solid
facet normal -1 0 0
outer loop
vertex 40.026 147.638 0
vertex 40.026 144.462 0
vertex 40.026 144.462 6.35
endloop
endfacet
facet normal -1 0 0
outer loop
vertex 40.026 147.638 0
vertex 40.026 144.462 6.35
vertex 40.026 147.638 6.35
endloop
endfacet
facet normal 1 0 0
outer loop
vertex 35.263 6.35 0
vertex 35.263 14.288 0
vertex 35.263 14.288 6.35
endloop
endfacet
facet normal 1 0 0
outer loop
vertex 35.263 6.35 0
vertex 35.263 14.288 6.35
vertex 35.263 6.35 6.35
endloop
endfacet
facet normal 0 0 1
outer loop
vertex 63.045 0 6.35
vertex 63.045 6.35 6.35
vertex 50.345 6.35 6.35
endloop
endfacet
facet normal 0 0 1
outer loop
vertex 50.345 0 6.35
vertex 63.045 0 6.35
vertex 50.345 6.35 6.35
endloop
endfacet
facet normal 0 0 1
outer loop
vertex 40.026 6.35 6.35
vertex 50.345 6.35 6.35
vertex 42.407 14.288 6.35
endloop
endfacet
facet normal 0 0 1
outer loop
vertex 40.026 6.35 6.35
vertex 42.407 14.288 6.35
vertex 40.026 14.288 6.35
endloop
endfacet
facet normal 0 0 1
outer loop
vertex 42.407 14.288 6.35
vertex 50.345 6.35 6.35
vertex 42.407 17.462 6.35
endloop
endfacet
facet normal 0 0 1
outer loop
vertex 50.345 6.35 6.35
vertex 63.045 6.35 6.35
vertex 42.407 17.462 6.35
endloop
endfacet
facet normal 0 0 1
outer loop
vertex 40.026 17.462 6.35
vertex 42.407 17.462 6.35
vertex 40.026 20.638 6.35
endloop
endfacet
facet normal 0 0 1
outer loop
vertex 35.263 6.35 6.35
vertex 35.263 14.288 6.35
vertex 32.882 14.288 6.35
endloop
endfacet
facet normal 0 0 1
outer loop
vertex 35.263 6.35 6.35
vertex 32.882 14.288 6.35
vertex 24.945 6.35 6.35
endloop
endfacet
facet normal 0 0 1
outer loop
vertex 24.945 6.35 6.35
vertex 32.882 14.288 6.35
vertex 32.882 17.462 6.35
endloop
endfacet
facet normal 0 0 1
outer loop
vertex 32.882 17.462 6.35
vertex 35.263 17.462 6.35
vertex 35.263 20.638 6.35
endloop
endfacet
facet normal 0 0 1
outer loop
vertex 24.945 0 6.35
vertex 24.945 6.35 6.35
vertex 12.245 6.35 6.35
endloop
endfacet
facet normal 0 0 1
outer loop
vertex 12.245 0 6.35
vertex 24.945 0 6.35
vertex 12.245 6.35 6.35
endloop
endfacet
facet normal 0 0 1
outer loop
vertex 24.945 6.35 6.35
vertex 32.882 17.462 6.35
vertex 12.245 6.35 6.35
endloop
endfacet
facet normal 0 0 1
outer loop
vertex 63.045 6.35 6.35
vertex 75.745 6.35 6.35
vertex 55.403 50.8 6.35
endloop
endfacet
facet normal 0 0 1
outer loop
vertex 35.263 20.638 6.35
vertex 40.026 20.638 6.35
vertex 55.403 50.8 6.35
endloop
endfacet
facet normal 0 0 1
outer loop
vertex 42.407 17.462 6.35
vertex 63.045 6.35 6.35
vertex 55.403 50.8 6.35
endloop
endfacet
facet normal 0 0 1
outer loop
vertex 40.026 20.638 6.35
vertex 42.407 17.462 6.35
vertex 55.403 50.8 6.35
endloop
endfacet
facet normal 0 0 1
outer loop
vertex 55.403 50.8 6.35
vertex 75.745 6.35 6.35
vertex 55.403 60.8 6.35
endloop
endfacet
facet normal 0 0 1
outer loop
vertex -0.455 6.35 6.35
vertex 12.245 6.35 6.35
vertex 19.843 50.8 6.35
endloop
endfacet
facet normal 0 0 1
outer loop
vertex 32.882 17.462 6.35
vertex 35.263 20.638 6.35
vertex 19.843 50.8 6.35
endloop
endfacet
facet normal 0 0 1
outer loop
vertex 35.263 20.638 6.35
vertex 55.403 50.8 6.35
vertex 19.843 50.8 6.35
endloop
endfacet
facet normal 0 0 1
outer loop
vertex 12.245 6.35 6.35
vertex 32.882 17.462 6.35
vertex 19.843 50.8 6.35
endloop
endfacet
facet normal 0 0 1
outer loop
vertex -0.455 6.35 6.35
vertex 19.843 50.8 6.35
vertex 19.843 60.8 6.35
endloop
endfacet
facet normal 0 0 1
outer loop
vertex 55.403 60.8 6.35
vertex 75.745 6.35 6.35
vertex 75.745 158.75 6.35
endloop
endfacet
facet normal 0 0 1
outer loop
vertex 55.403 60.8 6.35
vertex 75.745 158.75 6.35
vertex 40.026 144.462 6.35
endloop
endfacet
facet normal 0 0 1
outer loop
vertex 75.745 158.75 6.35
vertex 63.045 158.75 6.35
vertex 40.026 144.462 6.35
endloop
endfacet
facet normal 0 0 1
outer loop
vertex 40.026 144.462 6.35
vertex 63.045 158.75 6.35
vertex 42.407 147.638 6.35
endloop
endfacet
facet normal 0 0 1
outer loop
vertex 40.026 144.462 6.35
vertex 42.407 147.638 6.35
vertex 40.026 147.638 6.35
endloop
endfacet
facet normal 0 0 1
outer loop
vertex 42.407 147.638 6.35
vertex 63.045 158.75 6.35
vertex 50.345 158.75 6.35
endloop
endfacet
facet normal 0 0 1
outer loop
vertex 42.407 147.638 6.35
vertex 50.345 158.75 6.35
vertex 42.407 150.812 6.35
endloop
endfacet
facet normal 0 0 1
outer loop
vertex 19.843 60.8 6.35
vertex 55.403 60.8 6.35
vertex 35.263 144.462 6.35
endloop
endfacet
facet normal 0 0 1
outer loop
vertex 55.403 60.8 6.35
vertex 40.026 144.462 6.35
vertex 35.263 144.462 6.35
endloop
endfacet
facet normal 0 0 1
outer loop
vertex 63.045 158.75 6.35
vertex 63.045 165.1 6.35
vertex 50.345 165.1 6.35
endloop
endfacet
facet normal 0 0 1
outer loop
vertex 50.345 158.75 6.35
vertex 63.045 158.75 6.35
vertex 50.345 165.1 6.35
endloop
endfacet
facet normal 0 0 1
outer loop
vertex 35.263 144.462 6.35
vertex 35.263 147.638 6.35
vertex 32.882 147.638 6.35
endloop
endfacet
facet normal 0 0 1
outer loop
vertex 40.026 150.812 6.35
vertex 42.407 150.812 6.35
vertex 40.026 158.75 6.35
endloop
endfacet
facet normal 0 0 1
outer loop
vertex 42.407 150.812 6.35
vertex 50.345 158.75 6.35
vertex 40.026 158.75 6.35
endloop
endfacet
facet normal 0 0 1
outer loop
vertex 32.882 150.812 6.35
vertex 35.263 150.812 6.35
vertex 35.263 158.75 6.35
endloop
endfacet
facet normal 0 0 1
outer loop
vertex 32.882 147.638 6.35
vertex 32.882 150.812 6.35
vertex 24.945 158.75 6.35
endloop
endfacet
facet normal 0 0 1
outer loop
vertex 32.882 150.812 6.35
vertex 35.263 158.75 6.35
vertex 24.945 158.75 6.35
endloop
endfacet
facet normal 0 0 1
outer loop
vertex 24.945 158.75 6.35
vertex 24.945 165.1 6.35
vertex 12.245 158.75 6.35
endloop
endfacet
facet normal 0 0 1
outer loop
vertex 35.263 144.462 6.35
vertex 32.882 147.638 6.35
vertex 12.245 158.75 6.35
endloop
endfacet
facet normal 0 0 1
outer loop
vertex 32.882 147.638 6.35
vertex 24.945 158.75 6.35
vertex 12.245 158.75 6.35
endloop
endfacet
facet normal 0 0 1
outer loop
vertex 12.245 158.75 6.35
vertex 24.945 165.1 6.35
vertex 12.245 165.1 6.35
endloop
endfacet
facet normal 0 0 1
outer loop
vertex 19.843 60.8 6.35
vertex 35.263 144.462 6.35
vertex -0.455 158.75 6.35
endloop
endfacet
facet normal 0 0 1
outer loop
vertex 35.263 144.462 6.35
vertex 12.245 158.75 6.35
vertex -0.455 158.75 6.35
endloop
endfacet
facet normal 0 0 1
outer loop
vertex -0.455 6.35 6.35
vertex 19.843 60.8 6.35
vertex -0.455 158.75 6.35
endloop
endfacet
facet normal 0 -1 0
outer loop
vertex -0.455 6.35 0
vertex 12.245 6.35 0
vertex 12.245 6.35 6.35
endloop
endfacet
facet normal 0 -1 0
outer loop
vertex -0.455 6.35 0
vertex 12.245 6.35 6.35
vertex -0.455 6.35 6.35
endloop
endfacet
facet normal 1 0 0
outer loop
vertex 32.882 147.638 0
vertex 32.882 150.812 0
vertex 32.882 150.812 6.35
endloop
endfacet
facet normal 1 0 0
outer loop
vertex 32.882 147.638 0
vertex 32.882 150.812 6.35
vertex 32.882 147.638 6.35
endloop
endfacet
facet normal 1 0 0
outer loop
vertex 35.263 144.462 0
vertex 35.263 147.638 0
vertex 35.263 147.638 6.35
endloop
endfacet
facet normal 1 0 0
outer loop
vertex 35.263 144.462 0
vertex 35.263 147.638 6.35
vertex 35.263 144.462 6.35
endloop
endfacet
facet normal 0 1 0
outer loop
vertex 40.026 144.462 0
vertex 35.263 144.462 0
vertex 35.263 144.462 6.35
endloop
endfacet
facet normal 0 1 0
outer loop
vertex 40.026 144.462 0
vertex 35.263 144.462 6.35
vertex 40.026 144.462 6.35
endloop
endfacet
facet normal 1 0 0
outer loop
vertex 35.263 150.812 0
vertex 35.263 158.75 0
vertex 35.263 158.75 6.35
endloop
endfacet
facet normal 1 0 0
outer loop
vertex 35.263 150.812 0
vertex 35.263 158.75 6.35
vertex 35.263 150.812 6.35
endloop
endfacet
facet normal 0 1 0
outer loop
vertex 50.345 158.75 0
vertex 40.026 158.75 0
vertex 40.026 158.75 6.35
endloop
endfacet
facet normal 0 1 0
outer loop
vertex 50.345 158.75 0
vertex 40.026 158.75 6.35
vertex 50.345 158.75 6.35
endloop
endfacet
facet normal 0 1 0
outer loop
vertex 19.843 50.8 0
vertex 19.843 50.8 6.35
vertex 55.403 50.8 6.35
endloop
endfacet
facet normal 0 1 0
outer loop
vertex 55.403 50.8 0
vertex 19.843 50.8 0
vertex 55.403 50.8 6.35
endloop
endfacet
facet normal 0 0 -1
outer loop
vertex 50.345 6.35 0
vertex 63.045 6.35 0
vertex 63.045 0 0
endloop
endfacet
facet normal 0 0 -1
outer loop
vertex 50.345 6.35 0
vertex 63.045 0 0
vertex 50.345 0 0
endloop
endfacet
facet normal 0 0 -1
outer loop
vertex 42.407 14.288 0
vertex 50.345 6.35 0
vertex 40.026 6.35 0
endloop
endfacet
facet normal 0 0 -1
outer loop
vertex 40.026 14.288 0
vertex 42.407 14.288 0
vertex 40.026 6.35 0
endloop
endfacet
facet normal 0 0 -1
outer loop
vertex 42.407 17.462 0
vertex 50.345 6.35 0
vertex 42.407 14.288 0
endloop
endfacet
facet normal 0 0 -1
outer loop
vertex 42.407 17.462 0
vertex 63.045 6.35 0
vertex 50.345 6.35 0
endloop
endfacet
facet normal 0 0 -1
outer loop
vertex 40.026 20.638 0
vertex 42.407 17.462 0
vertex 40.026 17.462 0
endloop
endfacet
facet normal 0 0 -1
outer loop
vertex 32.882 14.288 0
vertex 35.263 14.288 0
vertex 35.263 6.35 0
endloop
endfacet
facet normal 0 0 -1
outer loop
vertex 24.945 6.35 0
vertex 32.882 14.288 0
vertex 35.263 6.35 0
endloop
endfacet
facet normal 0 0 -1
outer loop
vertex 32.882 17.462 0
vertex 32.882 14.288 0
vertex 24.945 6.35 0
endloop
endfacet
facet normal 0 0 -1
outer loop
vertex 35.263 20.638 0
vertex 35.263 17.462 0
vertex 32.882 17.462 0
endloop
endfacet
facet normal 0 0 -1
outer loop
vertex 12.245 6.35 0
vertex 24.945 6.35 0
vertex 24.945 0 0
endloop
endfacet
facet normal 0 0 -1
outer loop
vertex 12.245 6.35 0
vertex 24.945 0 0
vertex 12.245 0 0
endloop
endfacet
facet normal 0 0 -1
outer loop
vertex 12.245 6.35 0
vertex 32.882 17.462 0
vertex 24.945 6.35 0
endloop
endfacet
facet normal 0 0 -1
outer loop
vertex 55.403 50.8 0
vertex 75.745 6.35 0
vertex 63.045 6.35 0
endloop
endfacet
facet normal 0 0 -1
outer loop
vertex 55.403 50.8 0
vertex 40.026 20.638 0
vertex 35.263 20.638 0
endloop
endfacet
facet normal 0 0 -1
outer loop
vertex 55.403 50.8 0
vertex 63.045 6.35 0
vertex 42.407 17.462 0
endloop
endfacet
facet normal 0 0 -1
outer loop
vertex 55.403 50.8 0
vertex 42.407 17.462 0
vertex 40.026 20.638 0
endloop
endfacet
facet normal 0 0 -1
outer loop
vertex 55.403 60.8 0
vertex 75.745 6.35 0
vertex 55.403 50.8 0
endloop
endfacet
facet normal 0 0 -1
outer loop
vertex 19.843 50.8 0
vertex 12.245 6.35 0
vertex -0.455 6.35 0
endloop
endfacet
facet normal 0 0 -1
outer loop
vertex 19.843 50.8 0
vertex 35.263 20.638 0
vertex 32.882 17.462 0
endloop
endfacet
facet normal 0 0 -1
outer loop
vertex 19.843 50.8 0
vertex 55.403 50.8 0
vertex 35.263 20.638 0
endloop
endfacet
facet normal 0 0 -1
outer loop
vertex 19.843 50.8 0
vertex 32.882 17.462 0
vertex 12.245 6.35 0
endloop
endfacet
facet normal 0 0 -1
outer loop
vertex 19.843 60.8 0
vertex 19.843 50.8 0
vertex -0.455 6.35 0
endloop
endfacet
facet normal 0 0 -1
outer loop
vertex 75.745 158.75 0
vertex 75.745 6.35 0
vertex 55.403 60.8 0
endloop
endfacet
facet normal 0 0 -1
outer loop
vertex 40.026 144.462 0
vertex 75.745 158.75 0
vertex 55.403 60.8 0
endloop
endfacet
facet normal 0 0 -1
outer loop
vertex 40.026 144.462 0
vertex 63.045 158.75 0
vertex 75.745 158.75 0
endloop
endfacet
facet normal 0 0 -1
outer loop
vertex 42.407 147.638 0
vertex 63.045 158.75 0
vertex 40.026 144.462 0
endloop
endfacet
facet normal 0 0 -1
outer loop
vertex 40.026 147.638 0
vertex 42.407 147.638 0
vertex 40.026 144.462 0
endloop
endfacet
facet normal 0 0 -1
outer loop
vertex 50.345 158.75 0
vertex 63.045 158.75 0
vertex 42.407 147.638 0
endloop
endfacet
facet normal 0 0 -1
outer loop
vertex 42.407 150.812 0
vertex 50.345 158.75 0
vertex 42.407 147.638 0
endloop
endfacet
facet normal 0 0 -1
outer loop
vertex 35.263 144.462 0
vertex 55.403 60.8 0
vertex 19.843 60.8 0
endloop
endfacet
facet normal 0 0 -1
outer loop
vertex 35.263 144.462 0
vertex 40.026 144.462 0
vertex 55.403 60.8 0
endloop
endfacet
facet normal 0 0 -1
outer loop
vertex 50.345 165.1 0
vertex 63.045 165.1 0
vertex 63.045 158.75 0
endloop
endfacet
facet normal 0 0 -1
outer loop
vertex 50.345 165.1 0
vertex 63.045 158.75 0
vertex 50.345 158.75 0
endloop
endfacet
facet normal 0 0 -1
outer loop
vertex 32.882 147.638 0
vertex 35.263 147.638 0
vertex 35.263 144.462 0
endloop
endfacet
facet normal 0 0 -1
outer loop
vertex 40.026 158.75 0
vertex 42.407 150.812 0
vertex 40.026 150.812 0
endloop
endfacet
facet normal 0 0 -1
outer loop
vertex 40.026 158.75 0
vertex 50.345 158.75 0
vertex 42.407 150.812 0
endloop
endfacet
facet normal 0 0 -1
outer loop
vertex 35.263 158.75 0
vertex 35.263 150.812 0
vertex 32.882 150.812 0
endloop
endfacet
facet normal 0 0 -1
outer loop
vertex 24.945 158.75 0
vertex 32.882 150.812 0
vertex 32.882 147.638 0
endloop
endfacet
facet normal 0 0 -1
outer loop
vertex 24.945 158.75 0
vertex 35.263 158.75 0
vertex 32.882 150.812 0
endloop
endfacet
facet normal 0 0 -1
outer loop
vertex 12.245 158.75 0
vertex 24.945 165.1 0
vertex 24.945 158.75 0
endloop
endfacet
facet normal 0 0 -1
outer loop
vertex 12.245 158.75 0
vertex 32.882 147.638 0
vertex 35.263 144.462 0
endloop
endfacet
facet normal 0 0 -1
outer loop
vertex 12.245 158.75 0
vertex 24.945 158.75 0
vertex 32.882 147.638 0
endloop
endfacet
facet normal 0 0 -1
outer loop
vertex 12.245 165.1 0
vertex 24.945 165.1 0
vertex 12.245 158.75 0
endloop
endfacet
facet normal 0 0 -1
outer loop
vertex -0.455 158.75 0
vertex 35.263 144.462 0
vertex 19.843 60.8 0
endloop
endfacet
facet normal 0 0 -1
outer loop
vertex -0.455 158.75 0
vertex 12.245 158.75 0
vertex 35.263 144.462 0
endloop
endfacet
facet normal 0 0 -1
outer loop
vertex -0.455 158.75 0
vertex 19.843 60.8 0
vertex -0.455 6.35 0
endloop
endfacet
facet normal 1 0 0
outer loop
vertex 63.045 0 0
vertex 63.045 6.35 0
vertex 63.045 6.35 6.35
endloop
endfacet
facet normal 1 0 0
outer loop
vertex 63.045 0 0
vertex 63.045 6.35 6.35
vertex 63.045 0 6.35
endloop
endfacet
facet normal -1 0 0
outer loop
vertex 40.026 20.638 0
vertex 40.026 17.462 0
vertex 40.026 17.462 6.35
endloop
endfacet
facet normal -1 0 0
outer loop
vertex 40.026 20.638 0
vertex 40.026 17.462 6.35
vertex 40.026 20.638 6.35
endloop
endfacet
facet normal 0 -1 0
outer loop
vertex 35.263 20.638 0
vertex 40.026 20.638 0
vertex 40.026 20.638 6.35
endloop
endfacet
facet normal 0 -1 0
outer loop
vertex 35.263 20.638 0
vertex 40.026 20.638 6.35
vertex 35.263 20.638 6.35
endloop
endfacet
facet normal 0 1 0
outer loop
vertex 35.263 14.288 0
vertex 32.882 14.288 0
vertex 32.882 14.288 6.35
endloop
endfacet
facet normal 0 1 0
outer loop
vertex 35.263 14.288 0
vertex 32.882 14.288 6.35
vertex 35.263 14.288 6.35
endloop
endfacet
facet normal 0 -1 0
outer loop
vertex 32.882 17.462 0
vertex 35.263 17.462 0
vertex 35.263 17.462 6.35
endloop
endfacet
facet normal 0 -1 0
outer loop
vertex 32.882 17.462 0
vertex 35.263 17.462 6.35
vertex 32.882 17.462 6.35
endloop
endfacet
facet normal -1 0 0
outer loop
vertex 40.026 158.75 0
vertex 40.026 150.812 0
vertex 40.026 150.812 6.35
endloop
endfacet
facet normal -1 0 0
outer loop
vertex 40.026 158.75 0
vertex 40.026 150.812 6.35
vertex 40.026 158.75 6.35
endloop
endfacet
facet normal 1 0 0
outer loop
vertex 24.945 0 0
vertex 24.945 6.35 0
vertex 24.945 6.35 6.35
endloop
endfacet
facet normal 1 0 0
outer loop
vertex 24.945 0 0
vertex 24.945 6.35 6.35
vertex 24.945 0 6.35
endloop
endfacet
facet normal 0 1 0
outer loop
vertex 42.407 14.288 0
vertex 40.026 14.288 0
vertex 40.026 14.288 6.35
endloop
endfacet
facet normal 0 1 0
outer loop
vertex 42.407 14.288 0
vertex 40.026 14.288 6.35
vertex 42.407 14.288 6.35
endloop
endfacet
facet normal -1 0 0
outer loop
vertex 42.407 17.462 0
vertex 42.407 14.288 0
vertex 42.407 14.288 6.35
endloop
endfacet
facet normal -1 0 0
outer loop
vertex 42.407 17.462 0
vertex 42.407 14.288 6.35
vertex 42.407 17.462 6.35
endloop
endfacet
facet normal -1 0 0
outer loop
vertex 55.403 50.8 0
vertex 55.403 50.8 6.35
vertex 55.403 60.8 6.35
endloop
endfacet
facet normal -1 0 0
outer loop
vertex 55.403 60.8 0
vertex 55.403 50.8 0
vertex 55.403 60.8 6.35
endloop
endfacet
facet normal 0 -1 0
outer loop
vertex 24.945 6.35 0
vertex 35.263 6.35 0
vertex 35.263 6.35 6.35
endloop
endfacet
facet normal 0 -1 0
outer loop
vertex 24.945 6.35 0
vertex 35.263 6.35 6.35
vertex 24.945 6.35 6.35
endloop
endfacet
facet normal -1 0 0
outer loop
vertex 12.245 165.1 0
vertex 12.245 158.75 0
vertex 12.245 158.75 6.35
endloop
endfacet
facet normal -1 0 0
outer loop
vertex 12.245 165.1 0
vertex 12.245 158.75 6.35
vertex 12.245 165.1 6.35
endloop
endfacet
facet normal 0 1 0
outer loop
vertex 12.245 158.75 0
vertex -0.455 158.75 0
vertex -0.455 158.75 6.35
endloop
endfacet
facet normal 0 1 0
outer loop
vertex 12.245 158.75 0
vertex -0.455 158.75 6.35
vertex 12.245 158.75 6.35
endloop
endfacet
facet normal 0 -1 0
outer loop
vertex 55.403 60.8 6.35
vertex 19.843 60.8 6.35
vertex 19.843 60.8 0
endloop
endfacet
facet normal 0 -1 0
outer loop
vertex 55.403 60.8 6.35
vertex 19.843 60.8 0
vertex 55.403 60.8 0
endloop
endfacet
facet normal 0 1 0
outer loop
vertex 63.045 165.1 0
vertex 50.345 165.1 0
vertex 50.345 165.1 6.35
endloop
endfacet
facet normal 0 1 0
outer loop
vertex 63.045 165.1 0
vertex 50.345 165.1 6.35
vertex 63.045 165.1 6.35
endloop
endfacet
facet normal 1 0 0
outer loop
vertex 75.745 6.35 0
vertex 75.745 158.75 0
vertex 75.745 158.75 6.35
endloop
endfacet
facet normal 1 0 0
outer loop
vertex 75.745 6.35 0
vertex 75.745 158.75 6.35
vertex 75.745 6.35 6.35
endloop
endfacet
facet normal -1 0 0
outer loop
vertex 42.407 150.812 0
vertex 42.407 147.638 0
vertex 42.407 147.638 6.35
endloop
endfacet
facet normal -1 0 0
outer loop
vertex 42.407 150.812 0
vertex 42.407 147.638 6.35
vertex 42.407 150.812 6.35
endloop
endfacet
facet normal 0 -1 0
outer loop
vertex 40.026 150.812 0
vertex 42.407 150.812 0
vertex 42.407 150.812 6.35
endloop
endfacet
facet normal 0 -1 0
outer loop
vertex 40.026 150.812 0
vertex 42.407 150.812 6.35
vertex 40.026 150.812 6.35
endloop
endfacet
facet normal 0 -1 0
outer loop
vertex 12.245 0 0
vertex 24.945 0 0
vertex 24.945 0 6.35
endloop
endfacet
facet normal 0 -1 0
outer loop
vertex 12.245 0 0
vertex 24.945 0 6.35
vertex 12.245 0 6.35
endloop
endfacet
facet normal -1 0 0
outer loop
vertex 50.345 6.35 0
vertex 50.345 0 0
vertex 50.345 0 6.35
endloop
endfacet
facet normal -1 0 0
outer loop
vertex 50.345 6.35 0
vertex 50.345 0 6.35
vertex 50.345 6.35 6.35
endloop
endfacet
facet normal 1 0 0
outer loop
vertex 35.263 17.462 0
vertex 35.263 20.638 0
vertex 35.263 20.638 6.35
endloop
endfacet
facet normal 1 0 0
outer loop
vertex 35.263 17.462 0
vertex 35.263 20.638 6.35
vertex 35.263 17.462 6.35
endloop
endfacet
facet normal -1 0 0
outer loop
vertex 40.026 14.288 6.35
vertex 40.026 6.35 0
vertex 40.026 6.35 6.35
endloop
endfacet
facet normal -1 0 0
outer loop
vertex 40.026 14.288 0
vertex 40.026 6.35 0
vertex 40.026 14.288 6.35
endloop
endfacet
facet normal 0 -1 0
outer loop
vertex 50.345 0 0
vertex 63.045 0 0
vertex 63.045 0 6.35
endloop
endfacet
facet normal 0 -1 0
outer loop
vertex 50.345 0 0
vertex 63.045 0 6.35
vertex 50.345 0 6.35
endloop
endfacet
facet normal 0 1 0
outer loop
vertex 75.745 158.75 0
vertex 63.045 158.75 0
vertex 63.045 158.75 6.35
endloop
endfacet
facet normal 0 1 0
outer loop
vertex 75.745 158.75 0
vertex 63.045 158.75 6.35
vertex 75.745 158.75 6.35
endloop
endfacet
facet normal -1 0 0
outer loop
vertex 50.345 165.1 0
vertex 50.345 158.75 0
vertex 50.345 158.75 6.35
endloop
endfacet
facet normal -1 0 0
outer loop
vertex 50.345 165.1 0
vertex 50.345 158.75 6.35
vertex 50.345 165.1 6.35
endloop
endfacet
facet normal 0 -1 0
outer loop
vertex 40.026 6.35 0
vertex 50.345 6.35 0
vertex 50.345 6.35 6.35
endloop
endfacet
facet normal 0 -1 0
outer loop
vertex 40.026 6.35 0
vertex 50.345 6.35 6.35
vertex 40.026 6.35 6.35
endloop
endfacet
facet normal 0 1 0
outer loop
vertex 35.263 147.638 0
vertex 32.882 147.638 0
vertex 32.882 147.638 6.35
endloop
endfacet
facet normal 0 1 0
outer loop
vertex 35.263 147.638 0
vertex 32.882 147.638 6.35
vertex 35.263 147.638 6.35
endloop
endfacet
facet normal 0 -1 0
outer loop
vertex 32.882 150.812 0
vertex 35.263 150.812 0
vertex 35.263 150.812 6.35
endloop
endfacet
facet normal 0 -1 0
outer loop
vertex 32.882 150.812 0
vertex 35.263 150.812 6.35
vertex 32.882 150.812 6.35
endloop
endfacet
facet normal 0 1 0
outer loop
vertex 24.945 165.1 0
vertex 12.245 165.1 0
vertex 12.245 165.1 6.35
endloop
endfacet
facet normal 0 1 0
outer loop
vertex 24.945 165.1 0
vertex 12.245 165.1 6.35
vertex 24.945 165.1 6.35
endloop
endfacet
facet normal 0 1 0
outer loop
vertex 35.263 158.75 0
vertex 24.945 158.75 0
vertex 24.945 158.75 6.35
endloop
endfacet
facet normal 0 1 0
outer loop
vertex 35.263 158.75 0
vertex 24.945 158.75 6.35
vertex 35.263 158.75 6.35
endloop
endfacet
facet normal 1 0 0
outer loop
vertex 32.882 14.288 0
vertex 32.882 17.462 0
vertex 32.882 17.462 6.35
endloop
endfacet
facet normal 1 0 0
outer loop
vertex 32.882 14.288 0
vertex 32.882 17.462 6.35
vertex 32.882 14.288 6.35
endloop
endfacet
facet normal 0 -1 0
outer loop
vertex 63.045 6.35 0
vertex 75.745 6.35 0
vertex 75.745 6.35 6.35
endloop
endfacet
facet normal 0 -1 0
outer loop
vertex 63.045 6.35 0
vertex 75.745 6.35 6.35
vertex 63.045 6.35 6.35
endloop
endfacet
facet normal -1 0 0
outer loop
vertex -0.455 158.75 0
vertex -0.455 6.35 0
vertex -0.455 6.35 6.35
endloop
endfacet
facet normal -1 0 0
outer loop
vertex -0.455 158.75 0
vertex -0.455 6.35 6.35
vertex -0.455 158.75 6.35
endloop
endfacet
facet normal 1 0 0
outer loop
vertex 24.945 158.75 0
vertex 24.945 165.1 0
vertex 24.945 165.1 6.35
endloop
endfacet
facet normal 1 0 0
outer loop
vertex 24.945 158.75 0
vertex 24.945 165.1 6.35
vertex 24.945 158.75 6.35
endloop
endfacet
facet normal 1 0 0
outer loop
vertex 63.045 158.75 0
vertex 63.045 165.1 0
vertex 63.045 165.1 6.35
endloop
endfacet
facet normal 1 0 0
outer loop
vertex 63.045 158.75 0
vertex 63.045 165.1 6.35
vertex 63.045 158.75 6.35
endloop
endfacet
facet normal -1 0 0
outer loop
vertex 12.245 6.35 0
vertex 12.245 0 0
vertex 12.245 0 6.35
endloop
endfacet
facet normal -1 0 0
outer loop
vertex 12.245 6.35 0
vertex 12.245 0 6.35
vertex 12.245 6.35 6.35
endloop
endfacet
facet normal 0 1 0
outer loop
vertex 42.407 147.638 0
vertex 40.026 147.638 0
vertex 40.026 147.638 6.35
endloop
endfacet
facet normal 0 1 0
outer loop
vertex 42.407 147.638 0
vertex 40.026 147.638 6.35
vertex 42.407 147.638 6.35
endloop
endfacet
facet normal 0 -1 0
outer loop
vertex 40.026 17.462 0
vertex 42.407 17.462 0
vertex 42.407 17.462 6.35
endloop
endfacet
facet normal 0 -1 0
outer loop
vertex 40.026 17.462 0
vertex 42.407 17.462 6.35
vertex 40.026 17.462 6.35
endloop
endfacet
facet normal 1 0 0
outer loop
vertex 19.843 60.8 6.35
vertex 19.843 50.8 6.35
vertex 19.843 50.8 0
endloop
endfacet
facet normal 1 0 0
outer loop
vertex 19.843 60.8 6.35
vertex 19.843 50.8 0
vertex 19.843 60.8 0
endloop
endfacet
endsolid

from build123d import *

# Parameters (mm, degrees)
SKETCH2_W           = 30
SKETCH2_H           = 10
BOSS_EXTRUDE1_DEPTH = 6.35
SKETCH3_W           = 35.56
SKETCH3_H           = 10
CUT_EXTRUDE1_DEPTH  = 6.35


with BuildPart() as part:
    # Sketch2 → Boss-Extrude1 (new body)
    with BuildSketch(Plane.XY):
        Polygon((12.244662888, 165.1), (24.944662888, 165.1), (24.944662888, 158.75), (35.263412888, 158.75), (35.263412888, 150.8125), (32.882162888, 150.8125), (32.882162888, 147.6375), (35.263412888, 147.6375), (35.263412888, 144.4625), (40.025912888, 144.4625), (40.025912888, 147.6375), (42.407162888, 147.6375), (42.407162888, 150.8125), (40.025912888, 150.8125), (40.025912888, 158.75), (50.344662888, 158.75), (50.344662888, 165.1), (63.044662888, 165.1), (63.044662888, 158.75), (75.744662888, 158.75), (75.744662888, 6.35), (63.044662888, 6.35), (63.044662888, 0), (50.344662888, 0), (50.344662888, 6.35), (40.025912888, 6.35), (40.025912888, 14.2875), (42.407162888, 14.2875), (42.407162888, 17.4625), (40.025912888, 17.4625), (40.025912888, 20.6375), (35.263412888, 20.6375), (35.263412888, 17.4625), (32.882162888, 17.4625), (32.882162888, 14.2875), (35.263412888, 14.2875), (35.263412888, 6.35), (24.944662888, 6.35), (24.944662888, 0), (12.244662888, 0), (12.244662888, 6.35), (-0.455337112, 6.35), (-0.455337112, 158.75), (12.244662888, 158.75), align=None)
        with Locations((37.644662886, 55.8)):
            Rectangle(SKETCH2_W, SKETCH2_H, mode=Mode.SUBTRACT)
    extrude(amount=BOSS_EXTRUDE1_DEPTH)

    # Sketch3 → Cut-Extrude1 (cut)
    with BuildSketch(Plane.XY.offset(6.35)):
        with Locations((37.623375509, 55.8)):
            Rectangle(SKETCH3_W, SKETCH3_H)
    extrude(amount=-CUT_EXTRUDE1_DEPTH, mode=Mode.SUBTRACT)


solid = part.part
